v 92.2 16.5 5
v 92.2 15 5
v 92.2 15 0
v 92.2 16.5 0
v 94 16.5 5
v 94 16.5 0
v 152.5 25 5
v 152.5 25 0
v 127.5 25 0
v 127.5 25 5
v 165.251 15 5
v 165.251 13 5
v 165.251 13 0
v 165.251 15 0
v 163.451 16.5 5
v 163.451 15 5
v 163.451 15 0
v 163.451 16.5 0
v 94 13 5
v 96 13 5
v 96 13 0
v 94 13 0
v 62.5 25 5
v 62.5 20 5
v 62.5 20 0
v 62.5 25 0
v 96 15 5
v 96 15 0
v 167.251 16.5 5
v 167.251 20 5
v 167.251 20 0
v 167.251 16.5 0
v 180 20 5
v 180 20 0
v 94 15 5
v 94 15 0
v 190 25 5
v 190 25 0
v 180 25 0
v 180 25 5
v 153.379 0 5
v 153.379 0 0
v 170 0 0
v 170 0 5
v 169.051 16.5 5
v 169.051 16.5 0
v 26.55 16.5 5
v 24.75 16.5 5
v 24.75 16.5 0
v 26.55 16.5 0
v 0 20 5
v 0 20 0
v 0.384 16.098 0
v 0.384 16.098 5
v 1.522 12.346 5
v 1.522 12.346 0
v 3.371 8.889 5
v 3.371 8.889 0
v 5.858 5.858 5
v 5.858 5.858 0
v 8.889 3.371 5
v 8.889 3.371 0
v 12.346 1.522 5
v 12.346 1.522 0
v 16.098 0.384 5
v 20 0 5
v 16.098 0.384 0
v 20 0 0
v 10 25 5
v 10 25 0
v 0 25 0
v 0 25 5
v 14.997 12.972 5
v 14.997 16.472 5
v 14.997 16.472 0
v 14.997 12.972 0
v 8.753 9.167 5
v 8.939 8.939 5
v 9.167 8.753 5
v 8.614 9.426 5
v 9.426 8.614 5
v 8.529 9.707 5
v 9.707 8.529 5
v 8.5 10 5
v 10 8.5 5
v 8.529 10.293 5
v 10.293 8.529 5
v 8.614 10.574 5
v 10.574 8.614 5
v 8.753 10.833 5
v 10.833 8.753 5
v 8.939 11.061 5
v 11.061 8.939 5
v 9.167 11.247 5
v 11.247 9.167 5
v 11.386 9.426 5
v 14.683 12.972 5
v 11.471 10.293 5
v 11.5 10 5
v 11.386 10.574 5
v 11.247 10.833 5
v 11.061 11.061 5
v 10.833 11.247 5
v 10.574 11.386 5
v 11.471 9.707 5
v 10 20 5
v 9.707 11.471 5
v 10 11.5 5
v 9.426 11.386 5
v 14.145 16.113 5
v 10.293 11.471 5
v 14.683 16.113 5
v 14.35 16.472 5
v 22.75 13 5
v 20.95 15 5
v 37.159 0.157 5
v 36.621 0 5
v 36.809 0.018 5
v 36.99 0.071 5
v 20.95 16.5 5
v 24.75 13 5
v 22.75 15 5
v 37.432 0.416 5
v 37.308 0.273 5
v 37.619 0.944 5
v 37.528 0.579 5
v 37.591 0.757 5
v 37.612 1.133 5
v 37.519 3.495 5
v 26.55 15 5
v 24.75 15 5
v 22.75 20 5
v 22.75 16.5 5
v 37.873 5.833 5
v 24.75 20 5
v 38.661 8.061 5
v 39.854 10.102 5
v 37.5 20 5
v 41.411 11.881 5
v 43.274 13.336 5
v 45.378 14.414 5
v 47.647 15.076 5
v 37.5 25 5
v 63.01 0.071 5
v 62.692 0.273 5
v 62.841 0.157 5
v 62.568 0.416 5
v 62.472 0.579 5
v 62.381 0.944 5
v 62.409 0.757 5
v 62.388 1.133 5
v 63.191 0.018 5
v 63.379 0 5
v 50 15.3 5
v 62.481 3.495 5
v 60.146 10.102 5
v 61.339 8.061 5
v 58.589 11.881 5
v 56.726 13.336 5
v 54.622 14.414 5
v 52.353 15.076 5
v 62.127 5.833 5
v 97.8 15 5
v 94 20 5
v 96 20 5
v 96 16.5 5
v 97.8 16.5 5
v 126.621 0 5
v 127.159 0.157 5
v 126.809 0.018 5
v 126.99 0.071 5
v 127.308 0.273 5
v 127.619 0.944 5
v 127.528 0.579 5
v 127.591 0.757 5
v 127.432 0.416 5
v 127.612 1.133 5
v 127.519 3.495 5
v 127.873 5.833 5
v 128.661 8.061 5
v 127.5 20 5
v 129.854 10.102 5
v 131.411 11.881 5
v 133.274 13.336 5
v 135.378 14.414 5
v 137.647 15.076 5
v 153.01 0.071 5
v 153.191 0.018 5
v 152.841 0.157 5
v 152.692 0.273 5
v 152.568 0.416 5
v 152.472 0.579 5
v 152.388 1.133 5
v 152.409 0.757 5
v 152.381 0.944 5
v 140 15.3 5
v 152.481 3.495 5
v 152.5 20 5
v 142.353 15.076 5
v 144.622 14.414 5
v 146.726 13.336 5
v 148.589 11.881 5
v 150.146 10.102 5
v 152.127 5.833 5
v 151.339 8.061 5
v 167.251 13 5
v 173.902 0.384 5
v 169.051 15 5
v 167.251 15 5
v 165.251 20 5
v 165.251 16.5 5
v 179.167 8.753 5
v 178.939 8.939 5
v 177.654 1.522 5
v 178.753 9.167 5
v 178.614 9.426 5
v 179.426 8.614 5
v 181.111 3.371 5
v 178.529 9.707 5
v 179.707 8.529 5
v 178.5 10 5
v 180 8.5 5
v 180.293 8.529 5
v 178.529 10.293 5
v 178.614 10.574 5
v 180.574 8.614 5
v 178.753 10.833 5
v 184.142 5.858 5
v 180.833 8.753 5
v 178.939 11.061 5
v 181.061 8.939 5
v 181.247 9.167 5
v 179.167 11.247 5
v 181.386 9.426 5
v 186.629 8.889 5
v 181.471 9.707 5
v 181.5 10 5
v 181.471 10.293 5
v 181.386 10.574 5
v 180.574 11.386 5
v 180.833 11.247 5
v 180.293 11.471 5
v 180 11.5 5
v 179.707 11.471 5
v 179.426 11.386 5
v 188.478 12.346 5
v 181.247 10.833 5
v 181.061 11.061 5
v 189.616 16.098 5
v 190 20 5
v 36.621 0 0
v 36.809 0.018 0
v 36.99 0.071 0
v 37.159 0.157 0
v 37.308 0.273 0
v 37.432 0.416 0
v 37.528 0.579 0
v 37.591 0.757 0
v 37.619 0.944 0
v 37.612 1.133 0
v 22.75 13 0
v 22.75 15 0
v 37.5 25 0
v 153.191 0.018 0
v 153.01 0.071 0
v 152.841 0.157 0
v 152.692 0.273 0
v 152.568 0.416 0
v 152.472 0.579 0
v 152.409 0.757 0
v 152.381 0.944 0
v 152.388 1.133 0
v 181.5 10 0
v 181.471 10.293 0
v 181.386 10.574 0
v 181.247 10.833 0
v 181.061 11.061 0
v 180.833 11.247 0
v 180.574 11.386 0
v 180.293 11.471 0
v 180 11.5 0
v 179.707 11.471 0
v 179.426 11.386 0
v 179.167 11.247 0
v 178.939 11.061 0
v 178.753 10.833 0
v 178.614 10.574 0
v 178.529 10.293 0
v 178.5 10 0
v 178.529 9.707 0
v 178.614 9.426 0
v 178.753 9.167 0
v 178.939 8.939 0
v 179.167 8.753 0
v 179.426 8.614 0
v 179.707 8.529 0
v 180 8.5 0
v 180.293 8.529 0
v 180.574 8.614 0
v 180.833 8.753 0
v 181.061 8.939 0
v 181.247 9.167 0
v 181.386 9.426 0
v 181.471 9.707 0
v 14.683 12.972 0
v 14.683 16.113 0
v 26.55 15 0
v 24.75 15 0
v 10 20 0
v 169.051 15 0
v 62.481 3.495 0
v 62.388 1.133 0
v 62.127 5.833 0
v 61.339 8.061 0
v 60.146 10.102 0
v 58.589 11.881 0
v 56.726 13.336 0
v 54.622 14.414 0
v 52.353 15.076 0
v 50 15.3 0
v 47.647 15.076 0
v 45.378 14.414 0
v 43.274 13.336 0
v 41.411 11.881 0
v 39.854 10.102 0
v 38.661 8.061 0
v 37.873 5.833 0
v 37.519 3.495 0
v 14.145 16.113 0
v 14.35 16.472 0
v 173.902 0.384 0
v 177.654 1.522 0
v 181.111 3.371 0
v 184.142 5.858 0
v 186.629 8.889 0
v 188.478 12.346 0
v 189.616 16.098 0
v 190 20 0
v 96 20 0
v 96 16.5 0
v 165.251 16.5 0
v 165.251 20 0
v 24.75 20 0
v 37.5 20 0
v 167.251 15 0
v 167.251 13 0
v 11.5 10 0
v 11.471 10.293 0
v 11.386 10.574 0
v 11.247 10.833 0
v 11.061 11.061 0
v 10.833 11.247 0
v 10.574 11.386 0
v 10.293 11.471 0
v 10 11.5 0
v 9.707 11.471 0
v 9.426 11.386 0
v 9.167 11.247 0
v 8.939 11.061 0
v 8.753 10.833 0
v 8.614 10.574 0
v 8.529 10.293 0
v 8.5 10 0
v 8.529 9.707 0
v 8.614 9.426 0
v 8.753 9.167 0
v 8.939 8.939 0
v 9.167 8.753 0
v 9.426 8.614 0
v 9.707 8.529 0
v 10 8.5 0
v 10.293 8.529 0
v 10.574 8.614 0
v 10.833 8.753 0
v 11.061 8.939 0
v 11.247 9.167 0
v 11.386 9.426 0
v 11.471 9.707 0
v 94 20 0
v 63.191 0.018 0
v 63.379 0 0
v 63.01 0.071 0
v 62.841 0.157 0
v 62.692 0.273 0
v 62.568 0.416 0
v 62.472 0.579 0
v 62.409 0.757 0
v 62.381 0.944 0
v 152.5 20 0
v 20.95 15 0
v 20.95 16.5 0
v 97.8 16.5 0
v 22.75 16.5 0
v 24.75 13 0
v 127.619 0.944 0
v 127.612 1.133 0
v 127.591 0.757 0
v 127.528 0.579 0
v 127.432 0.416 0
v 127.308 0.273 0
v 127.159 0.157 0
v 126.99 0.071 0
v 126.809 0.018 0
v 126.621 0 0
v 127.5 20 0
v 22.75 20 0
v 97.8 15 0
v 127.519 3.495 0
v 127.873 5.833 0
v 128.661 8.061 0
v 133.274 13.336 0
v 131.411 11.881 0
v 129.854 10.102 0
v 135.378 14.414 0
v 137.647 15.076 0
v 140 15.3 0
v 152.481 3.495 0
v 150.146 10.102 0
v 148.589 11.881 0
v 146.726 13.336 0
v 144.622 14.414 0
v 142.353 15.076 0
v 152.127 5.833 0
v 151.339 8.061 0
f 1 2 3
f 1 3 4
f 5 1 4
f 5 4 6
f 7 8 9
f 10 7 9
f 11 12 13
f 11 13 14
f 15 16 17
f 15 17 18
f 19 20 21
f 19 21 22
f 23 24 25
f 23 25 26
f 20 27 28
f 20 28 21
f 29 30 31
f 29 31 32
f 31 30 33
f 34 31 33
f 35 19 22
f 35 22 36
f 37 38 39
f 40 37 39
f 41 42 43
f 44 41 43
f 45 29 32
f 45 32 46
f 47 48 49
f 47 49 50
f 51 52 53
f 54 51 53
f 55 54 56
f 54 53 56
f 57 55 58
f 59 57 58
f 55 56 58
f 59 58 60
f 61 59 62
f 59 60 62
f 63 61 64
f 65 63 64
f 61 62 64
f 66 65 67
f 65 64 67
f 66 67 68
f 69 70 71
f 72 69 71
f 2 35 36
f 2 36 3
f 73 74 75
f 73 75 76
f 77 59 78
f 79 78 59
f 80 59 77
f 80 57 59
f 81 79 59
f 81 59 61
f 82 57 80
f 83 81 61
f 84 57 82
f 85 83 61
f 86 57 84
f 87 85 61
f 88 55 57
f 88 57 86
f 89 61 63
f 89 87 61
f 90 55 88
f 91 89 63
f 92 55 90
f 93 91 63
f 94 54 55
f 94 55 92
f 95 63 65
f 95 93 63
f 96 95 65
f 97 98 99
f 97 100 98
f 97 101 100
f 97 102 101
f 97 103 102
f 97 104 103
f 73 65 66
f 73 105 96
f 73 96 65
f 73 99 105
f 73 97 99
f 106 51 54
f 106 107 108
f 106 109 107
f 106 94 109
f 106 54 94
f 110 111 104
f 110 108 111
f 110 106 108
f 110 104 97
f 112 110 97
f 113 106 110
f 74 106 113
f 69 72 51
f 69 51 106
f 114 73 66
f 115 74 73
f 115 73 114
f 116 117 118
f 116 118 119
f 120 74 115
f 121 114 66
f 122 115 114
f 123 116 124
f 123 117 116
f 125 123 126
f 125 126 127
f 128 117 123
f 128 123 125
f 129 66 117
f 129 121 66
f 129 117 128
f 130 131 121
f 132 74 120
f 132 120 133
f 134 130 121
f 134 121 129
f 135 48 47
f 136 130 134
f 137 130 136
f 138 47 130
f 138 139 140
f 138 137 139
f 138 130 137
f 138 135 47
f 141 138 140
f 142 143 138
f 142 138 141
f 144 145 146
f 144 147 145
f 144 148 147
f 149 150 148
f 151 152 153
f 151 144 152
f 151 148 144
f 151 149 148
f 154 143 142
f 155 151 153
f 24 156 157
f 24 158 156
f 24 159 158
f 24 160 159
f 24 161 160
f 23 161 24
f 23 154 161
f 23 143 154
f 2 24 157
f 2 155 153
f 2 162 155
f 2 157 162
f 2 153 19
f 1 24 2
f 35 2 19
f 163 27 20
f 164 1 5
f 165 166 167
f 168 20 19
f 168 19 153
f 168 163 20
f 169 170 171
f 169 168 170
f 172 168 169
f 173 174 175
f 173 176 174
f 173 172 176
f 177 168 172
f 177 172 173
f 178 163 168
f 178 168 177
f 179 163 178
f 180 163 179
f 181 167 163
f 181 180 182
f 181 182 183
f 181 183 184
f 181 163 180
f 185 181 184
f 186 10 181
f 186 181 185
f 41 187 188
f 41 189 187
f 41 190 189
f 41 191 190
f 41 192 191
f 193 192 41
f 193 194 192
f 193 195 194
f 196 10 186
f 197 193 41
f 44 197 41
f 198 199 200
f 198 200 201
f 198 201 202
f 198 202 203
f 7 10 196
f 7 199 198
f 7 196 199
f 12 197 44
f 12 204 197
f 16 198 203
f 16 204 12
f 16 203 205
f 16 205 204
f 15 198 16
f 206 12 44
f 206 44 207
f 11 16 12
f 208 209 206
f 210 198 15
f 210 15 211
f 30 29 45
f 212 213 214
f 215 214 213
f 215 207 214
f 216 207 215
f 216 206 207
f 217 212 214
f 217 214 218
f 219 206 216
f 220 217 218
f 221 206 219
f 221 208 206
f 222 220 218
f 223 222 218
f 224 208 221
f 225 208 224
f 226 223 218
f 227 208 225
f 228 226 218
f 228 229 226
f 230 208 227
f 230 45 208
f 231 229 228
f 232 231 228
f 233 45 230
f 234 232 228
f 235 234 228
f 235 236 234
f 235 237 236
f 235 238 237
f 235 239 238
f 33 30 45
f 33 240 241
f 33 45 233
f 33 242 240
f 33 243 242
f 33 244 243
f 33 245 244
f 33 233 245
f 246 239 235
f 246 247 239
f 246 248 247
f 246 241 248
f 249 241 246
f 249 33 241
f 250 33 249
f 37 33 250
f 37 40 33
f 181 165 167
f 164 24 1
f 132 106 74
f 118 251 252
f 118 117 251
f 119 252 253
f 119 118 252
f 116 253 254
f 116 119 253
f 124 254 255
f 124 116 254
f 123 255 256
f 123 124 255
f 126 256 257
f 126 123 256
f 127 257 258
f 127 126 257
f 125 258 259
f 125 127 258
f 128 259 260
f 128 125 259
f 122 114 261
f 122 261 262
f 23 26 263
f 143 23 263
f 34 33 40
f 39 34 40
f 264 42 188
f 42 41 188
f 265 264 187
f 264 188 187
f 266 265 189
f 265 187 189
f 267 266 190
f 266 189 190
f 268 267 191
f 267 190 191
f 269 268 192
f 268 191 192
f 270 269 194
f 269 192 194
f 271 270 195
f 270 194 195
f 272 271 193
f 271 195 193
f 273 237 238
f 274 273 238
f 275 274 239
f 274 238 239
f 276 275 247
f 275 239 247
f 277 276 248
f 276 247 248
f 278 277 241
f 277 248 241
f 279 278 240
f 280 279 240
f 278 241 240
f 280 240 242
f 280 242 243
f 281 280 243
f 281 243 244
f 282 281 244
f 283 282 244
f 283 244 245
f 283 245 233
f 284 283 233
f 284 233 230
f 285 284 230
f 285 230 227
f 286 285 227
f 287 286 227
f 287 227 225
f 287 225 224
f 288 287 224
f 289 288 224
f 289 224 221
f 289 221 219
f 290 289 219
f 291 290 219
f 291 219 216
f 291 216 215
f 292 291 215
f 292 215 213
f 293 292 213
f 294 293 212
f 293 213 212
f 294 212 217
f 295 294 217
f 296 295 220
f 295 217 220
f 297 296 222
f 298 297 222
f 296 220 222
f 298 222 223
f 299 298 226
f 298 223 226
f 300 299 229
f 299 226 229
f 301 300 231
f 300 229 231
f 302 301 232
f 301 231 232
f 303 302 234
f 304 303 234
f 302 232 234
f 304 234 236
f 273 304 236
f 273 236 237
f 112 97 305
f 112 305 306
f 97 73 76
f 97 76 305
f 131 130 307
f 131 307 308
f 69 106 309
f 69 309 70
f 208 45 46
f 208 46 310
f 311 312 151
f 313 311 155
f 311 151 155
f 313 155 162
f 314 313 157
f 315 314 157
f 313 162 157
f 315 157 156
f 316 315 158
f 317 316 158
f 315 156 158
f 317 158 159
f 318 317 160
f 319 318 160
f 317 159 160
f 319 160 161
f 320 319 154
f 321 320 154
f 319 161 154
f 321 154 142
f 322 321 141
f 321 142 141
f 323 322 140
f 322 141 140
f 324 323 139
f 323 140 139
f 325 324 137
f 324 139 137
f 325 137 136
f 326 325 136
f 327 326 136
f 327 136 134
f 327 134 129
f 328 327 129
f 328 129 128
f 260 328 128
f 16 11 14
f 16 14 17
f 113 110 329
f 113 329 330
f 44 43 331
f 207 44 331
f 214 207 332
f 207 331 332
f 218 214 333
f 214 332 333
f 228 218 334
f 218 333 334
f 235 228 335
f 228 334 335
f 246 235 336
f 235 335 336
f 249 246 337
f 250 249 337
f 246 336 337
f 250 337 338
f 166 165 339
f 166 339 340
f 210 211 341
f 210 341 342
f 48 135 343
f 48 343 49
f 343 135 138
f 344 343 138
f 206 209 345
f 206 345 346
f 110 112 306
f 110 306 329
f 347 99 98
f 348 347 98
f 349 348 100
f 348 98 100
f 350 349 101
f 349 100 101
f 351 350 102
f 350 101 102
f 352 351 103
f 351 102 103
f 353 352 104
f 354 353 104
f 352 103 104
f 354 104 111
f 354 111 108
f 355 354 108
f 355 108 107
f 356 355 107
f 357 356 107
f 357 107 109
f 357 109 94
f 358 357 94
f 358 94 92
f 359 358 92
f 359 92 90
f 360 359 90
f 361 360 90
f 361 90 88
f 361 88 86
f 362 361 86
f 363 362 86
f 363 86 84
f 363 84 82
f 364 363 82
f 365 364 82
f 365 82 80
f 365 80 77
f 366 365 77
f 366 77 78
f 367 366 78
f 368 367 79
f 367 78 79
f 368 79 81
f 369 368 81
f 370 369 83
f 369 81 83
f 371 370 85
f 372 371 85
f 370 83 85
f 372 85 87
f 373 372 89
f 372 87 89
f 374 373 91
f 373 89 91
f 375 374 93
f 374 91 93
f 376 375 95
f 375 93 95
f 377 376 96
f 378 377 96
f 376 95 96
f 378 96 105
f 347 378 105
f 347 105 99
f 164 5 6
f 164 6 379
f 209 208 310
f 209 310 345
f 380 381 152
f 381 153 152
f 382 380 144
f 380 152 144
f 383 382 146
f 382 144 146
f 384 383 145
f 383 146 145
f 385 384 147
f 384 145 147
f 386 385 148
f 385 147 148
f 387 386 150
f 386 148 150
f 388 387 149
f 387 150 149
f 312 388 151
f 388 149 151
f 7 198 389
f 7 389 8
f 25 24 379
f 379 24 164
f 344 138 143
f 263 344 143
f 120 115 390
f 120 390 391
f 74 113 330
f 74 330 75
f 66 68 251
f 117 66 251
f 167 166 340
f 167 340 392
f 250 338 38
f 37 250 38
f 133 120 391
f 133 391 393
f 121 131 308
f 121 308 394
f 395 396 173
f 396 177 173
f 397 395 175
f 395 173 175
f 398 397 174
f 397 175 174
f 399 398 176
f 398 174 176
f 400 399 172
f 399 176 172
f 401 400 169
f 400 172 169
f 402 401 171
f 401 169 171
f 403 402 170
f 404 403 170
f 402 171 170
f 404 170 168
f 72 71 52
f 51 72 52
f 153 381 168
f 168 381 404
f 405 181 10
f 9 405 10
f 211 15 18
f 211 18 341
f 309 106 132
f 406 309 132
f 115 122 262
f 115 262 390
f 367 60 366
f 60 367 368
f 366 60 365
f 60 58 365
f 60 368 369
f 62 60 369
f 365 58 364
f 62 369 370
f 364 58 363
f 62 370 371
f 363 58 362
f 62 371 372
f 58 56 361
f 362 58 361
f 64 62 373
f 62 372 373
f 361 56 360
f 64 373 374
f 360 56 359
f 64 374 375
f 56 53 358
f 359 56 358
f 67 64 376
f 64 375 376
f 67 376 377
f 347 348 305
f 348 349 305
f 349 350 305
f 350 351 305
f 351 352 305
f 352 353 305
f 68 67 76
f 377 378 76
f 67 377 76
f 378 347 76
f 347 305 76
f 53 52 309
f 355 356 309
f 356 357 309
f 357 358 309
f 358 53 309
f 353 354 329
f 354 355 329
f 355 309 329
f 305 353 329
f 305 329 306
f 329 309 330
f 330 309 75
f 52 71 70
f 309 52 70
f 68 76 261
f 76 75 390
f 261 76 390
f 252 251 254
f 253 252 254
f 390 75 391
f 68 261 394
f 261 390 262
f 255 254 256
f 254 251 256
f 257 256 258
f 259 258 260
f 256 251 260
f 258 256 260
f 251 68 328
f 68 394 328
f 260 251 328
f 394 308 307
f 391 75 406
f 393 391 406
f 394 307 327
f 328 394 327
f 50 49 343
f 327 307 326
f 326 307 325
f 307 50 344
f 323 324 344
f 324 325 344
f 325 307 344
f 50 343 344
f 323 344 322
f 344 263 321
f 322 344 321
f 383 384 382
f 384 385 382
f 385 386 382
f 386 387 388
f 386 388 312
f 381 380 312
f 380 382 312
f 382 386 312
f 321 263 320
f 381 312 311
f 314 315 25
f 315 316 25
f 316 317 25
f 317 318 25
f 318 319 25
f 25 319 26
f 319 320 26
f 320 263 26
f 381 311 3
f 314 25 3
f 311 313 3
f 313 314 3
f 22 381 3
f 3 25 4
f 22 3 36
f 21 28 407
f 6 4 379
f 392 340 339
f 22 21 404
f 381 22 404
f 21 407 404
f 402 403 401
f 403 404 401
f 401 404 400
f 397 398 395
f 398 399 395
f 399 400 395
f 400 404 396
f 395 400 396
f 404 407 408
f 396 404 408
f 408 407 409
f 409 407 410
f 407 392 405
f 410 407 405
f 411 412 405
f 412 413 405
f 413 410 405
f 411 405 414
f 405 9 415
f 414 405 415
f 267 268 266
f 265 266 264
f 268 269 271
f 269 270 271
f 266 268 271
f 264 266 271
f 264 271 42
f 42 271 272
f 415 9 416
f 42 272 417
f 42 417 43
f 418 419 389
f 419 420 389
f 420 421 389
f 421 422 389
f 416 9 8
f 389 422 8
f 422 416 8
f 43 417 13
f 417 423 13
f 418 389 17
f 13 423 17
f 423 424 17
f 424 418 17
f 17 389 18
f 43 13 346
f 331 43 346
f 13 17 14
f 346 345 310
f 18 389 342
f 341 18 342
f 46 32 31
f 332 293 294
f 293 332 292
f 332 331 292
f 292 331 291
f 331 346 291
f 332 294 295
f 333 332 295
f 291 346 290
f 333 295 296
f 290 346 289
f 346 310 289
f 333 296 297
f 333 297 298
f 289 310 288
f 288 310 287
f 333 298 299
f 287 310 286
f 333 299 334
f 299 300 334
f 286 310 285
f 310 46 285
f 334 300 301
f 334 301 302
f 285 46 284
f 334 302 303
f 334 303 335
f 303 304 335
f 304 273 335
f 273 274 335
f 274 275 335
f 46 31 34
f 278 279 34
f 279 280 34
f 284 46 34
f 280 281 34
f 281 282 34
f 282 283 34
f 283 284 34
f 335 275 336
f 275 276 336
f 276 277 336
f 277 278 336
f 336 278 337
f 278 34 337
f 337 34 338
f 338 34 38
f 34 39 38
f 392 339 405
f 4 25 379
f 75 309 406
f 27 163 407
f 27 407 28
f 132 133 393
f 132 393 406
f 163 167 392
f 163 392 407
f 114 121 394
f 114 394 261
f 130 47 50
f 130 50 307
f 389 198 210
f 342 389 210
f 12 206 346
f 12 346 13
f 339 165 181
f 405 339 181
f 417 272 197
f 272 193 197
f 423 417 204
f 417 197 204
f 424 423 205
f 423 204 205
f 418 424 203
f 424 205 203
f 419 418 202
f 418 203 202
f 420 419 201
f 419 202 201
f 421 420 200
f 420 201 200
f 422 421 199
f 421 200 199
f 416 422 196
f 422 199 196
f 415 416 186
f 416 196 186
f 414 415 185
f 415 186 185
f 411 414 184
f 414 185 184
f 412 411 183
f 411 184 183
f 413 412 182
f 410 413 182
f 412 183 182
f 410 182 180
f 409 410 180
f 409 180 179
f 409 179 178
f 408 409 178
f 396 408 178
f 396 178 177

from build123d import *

# Parameters (mm, degrees)
RESSALTO_EXTRUS_O1_DEPTH = 5
ESBO_O2_R                = 12.5
CORTE_EXTRUS_O1_DEPTH    = 10
FILETE2_R                = 1
ESBO_O3_W                = 27.5
ESBO_O3_H                = 5
ESBO_O3_W_2              = 65
CORTE_EXTRUS_O3_DEPTH    = 6
CORTE_EXTRUS_O4_DEPTH    = 6
ESBO_O6_R                = 1.5
CORTE_EXTRUS_O5_DEPTH    = 6


with BuildPart() as part:
    # Esboço1 → Ressalto-extrusão1 (new body)
    with BuildSketch(Plane.XY):
        with BuildLine():
            Line((20, 0), (170, 0))
            ThreePointArc((170, 0), (184.142135624, 5.857864376), (190, 20))
            Line((190, 20), (190, 25))
            Line((190, 25), (0, 25))
            Line((0, 25), (0, 20))
            ThreePointArc((0, 20), (5.857864376, 5.857864376), (20, 0))
        make_face()
    extrude(amount=RESSALTO_EXTRUS_O1_DEPTH)

    # Esboço2 → Corte-extrusão1 (cut)
    with BuildSketch(Plane.XY.offset(5)):
        with Locations((140, 2.8)):
            Circle(ESBO_O2_R)
        with Locations((50, 2.8)):
            Circle(ESBO_O2_R)
    extrude(amount=-CORTE_EXTRUS_O1_DEPTH, mode=Mode.SUBTRACT)

    # Filete2
    filete2_edges = [part.edges().sort_by_distance(p)[0] for p in [
        (127.817635697, 0, 2.5),
        (152.182364303, 0, 2.5),
        (37.817635697, 0, 2.5),
        (62.182364303, 0, 2.5),
    ]]
    fillet(filete2_edges, radius=FILETE2_R)

    # Esboço3 → Corte-extrusão3 (cut, through all)
    with BuildSketch(Plane.XY.offset(5)):
        with Locations((23.75, 22.5)):
            Rectangle(ESBO_O3_W, ESBO_O3_H)
        with Locations((95, 22.5)):
            Rectangle(ESBO_O3_W_2, ESBO_O3_H)
        with Locations((166.25, 22.5)):
            Rectangle(ESBO_O3_W, ESBO_O3_H)
    extrude(amount=-CORTE_EXTRUS_O3_DEPTH, mode=Mode.SUBTRACT)

    # Esboço5 → Corte-extrusão4 (cut, through all)
    with BuildSketch(Plane.XY.offset(5)):
        Polygon((22.75, 13), (22.75, 15), (20.95, 15), (20.95, 16.5), (22.75, 16.5), (22.75, 20), (24.75, 20), (24.75, 16.5), (26.55, 16.5), (26.55, 15), (24.75, 15), (24.75, 13), align=None)
        Polygon((94, 13), (94, 15), (92.2, 15), (92.2, 16.5), (94, 16.5), (94, 20), (96, 20), (96, 16.5), (97.8, 16.5), (97.8, 15), (96, 15), (96, 13), align=None)
        Polygon((165.2510001, 13), (165.2510001, 15), (163.4510001, 15), (163.4510001, 16.5), (165.2510001, 16.5), (165.2510001, 20), (167.2510001, 20), (167.2510001, 16.5), (169.0510001, 16.5), (169.0510001, 15), (167.2510001, 15), (167.2510001, 13), align=None)
    extrude(amount=-CORTE_EXTRUS_O4_DEPTH, mode=Mode.SUBTRACT)

    # Esboço6 → Corte-extrusão5 (cut, through all)
    with BuildSketch(Plane.XY.offset(5)):
        with Locations((180, 10)):
            Circle(ESBO_O6_R)
        with Locations((10, 10)):
            Circle(ESBO_O6_R)
        Polygon((14.350226907, 16.471731735), (14.997362324, 16.471731735), (14.997362324, 12.971731735), (14.68325976, 12.971731735), (14.68325976, 16.112757376), (14.144798222, 16.112757376), align=None)
    extrude(amount=-CORTE_EXTRUS_O5_DEPTH, mode=Mode.SUBTRACT)


solid = part.part
